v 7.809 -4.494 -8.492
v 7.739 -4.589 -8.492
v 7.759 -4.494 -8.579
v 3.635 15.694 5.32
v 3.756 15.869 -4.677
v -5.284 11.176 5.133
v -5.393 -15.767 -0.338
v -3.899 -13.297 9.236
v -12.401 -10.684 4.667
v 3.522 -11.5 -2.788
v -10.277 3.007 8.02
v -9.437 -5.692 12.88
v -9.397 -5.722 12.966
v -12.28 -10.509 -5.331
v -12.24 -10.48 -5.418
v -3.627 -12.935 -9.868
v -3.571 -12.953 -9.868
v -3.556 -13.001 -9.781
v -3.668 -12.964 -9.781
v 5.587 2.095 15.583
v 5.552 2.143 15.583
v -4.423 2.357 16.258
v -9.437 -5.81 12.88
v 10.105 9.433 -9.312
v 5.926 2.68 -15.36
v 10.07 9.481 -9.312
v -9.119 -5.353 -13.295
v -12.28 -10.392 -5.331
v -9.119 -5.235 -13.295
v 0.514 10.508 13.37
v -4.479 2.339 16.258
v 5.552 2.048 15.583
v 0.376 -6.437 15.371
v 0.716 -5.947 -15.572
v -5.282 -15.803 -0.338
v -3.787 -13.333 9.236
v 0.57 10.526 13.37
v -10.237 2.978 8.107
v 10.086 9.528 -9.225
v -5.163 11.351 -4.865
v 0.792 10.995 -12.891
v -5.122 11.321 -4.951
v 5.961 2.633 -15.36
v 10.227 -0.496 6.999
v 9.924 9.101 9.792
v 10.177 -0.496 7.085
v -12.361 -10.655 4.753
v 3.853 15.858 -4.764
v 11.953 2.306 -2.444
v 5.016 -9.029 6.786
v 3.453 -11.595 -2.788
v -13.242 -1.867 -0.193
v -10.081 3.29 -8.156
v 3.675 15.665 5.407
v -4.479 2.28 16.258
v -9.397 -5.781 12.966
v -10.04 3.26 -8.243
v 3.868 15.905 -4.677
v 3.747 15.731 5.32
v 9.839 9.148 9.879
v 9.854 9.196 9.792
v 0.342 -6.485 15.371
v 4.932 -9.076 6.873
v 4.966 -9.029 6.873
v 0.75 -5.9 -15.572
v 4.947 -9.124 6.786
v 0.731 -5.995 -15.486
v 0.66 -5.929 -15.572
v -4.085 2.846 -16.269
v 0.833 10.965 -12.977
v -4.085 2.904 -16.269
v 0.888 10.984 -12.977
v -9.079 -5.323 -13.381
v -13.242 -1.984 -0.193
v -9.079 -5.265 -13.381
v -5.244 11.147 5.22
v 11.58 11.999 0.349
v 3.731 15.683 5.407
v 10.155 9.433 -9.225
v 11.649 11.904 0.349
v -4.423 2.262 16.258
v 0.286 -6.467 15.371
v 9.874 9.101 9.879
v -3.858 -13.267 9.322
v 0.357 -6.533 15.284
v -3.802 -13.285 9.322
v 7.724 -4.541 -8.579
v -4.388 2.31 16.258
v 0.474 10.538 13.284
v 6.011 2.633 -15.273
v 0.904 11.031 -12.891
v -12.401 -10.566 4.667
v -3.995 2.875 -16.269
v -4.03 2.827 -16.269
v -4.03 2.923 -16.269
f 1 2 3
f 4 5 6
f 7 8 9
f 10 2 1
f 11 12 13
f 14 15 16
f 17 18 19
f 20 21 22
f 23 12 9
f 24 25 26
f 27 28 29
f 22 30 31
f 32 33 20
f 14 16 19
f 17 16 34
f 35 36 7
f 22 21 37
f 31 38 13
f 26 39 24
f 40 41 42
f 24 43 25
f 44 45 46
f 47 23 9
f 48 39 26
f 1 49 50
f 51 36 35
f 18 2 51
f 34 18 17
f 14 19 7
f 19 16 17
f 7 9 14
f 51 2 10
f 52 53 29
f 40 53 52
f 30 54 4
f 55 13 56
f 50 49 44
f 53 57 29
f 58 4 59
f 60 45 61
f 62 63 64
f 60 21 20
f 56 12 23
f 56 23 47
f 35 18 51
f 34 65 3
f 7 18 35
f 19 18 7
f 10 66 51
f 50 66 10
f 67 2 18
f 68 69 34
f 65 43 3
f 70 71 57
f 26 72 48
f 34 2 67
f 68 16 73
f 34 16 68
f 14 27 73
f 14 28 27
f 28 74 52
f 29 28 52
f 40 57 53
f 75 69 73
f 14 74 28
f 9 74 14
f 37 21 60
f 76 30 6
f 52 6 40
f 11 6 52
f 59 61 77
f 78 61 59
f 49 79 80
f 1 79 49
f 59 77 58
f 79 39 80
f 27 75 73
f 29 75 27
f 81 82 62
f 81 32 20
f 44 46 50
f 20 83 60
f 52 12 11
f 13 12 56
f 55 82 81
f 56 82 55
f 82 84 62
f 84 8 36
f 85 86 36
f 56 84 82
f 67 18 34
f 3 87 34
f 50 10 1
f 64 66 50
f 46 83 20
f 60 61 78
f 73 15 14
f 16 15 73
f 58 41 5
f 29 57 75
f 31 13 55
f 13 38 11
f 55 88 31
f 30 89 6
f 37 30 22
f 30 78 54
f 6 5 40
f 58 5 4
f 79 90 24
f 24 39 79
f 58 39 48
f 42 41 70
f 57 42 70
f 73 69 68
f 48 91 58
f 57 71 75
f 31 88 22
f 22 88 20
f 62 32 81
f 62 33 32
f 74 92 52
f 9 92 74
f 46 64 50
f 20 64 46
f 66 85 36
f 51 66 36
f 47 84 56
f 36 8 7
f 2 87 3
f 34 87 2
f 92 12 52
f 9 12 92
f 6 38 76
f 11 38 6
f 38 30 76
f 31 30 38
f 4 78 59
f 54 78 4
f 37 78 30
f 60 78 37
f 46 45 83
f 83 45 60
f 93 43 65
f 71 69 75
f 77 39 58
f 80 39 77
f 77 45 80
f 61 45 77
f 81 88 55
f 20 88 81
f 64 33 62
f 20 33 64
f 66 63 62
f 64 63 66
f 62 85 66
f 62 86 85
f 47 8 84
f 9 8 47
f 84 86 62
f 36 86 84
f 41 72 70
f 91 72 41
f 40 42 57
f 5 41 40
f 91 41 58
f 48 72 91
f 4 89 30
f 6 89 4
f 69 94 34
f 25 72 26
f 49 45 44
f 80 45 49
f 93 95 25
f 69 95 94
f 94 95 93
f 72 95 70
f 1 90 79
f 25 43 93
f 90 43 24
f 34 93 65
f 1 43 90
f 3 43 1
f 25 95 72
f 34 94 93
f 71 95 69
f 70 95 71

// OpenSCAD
// Auto-generated OpenSCAD file

    inner_points = 10*[[0.0700122788145141, -0.5899867463576787, -1.5485662456686995], [0.5536702496302224, 0.20951801959251765, 1.5496595452459865], [0.3837392237867054, 1.5810057288487958, -0.4677500511375285], [-1.2320578889140816, -1.0625183532543938, 0.46665675156024133], [0.5910683620661039, 0.2632714000188084, -1.527327277975484], [-0.3586733514761777, -1.290553069521443, -0.9780967397079723], [0.9823558799209142, 0.910084342756282, 0.9791900392852595], [0.03261416637863256, -0.6437401267839695, 1.5284205775527713], [0.08730081805517803, 1.0936030862461223, -1.2890678553955885], [-1.2199065055817309, -1.0450528212147916, -0.5331168723535343], [0.3715878404543547, 1.5635401968091933, 0.5320235727762472], [-0.9356194831825542, -0.5751157106517207, 1.2879745558183013], [1.0054691845213792, 0.9433057588699332, -0.9224924004011736], [-0.5312451885235989, -1.5708350453974695, -0.033818721824939835], [1.1549277169683354, 1.1903663186323088, 0.034912021402226934], [-0.3817866560766427, -1.3237744856350941, 0.9235856999784607], [-0.40449798132161563, 0.2875035122688776, -1.6182143543367875], [-0.903806748608131, -0.5293903541404417, -1.3294667726436182], [0.05548808348075484, 1.0478777297348434, 1.328373473066331], [-0.4438206838057605, 0.23098386332552417, 1.6171210547595003], [1.185256496068756, 0.23064800053697915, -0.2444102209461938], [-0.9999741793416539, 0.3230904868027798, -0.8156299881576774], [0.7708556736134807, -0.4493863583141455, -0.8492450985205042], [1.0126846590213348, -0.04963397533904733, 0.6998677969368388], [-0.5081753799648603, 1.1291900607800247, -0.4864834892164787], [-1.3160739363152536, -0.19257198027157013, -0.019280087867593804], [0.3421700433227889, -1.1499526814779097, -0.27877559255977724], [0.49162857576974506, -0.9028921217155343, 0.6786288292436233], [-0.5203267632972108, 1.1117245287404225, 0.5132901346972969], [-1.0196355305837264, 0.2948306623311031, 0.8020377163904663]];

    outer_points = 10*[[-0.6456324675968002, -0.1902777633799494, -1.5332707609435225], [1.2694564683720715, -0.1902777633799494, 1.0752863732456437], [0.2636354735959513, 1.6422548517857285, -0.19354967234384785], [-0.8874594743712225, -1.26169932502583, 0.6515340600417266], [-0.12445942987975245, 0.663172955851532, -1.532539597451722], [-0.8010560642832288, -1.0437284826114308, -1.0358118426032024], [1.4248800650585003, 0.663172955851532, 0.5778274549053235], [0.7482834306550238, -1.0437284826114308, 1.074555209753843], [-0.40911482956083434, 1.3649519033432802, -0.8794870633552854], [-1.3403702046054238, -0.9843963765833815, -0.1957999621855453], [0.7165462038301526, 1.3649519033432802, 0.6537843498834242], [-0.214709171214437, -0.9843963765833815, 1.3374714510531642], [0.5633926624800331, 1.1906345080596314, -1.0338976317303359], [-0.5313636886585785, -1.57119003481953, -0.23017524123000543], [1.1551876894338498, 1.1906345080596314, -0.22780914646787348], [0.06043133829523831, -1.57119003481953, 0.575913244032457], [-1.0447369557761081, 0.6389633591403906, -1.1420230539389458], [-1.4004448568371106, -0.2584078323804918, -0.8808778189619931], [0.7766208560618393, 0.6389633591403906, 1.338862206659872], [0.42091295500083675, -0.2584078323804918, 1.6000074416368246], [0.9947883785101106, 0.34107898385562474, -0.7303302627900091], [-1.1956160829923428, 0.4222705456034471, -0.17751296403220418], [0.3069362861503253, -0.18638256835247435, -1.2289722285113953], [1.2644807541347611, -0.18638256835247435, 0.07530633858318769], [-0.5599939567770693, 1.1482590898063367, 0.08502302655145622], [-1.1355414307606564, -0.3037179985994425, 0.5075648927442435], [0.1515126894638965, -1.039833287583956, -0.7315133101710751], [0.7433077164177133, -1.039833287583956, 0.07457517509138728], [-0.10708322654286795, 0.8709561413638883, 0.9323570487787283], [-0.4627911276038704, -0.02641505015699408, 1.1935022837556808]];

    // Convex hull for inner set (I)
    module inner_hull() {
        hull() {
            for (p = inner_points) {
                translate(p) sphere(r=0.1);
            }
        }
    }

    // Convex hull for outer set (O) minus inner hull (O \ I)
    module outer_minus_inner() {
        difference() {
            hull() {
                for (p = outer_points) {
                    translate(p) sphere(r=0.1);
                }
            }
            inner_hull(); // Subtract inner hull
        }
    }

    // Convex hull for outer set (O) minus all translated inner hulls
    module outer_minus_AllTranslationInner() {
        difference() {
            hull() {
                for (p = outer_points) {
                    translate(p) sphere(r=0.1);
                }
            }
            hull() {
                translate([0,0,50]) inner_hull();
                translate([0,0,-50]) inner_hull();
            }; // Subtract translated inner hulls
        }
    }

    // Difference between outer_minus_inner and outer_minus_AllTranslationInner
    module outer_minus_inner_diff() {
        difference() {
            // Outer minus inner
            difference() {
                hull() {
                    for (p = outer_points) {
                        translate(p) sphere(r=0.1);
                    }
                }
                inner_hull();
            }

            // Subtract Outer minus AllTranslationInner
            difference() {
                hull() {
                    for (p = outer_points) {
                        translate(p) sphere(r=0.1);
                    }
                }
                hull() {
                    translate([0,0,50]) inner_hull();
                    translate([0,0,-50]) inner_hull();
                };
            }
        }
    }

    // Rendering all with colors applied
    color([1, 0, 0, 0.5]) inner_hull(); // Transparent red
    
